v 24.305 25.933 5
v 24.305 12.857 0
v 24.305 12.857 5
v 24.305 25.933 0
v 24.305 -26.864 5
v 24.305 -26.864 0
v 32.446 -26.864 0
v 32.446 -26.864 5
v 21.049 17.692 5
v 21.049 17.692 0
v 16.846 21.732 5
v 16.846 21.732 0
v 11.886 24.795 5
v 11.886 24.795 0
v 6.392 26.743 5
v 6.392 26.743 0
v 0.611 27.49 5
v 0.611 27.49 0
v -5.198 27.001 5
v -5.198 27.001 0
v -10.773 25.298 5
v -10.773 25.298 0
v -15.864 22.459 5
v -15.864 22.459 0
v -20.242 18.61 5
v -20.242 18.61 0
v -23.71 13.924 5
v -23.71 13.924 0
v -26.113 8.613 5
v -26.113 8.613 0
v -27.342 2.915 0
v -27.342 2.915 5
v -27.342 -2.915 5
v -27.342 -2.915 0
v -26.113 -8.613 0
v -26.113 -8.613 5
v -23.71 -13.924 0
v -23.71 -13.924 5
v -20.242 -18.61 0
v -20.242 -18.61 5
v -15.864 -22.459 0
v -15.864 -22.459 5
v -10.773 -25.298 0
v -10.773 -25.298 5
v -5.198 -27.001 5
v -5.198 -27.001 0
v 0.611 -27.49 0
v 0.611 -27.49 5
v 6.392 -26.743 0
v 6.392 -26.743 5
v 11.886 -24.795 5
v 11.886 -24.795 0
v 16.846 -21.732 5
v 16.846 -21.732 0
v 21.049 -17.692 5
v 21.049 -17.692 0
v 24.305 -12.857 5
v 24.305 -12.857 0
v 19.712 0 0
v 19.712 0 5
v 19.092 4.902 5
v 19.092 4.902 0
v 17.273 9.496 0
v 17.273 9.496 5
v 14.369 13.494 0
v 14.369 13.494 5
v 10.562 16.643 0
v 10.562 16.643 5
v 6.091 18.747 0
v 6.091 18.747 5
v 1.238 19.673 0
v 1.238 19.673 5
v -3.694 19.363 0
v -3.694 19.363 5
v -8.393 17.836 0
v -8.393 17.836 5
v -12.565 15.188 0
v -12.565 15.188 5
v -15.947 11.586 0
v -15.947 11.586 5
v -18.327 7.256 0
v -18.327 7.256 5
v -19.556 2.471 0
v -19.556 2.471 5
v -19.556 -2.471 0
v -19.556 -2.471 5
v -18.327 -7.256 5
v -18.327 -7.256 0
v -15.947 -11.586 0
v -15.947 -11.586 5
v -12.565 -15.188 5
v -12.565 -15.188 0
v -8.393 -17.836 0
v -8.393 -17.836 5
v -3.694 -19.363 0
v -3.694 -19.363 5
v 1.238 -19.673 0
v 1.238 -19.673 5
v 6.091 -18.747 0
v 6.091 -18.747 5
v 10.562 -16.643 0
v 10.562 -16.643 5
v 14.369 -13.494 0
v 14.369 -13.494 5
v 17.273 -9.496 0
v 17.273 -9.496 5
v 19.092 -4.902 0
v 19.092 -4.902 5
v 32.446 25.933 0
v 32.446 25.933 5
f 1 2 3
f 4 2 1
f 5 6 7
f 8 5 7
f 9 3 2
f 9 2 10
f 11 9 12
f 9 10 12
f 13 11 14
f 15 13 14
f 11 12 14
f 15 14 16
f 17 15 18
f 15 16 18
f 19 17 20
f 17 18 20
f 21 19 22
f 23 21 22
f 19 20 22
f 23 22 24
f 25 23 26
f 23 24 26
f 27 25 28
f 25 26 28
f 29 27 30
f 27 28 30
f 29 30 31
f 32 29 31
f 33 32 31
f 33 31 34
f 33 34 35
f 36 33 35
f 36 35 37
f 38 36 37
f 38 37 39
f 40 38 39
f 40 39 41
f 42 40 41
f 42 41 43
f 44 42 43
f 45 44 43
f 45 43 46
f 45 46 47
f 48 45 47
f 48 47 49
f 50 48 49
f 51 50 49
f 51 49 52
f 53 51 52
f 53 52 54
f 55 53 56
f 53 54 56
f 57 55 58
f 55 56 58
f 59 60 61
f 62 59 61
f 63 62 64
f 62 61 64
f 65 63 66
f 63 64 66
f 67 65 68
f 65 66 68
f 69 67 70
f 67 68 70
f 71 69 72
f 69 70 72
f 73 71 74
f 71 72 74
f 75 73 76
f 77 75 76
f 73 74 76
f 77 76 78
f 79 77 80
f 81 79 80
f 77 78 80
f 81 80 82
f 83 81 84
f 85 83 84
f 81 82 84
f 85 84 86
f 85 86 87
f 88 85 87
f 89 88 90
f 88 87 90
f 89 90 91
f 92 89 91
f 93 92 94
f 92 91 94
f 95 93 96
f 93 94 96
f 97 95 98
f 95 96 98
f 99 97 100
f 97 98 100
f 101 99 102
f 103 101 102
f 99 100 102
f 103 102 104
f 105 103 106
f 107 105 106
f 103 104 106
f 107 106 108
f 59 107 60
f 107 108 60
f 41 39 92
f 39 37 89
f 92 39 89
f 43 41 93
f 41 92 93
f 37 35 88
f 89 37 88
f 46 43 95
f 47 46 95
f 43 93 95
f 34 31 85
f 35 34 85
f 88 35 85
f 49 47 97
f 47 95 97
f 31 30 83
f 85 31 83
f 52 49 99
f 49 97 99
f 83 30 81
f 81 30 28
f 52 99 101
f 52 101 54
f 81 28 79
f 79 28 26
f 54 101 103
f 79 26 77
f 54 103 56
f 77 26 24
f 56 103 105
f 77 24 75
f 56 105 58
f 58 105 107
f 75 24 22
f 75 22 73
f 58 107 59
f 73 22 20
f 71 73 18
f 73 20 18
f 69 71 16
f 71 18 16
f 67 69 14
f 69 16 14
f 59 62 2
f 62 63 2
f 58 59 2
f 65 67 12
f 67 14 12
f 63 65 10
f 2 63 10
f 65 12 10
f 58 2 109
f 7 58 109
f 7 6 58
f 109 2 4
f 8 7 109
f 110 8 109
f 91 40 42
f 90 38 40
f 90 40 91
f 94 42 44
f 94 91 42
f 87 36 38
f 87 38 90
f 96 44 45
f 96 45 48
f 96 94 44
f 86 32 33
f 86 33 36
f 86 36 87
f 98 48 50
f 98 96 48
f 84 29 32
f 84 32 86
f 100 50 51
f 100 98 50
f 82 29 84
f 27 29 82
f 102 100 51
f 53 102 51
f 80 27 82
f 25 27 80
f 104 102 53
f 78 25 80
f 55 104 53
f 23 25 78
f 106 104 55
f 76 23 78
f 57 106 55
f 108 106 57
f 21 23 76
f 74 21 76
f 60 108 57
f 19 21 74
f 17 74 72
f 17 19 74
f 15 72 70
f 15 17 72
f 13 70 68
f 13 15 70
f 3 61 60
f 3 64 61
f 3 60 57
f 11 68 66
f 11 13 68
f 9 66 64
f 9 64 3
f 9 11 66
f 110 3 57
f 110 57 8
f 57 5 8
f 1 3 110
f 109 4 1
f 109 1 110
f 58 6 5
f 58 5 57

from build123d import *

# Parameters (mm, degrees)
F0_R     = 27.496488
F1_DEPTH = 5
F2_R     = 19.711681
F3_DEPTH = 5
F4_W     = 8.140551
F4_H     = 52.797299
F5_DEPTH = 5


with BuildPart() as f1:
    # F0 (on Top) → F1 (new body)
    with BuildSketch(Plane.XY):
        Circle(F0_R)
    extrude(amount=F1_DEPTH)

    # F2 (on face) → F3 (cut)
    with BuildSketch(Plane.XY.offset(5)):
        Circle(F2_R)
    extrude(amount=-F3_DEPTH, mode=Mode.SUBTRACT)

    # F4 (on Top) → F5 (join)
    with BuildSketch(Plane.XY):
        with Locations((28.375639, -0.465175)):
            Rectangle(F4_W, F4_H)
    extrude(amount=F5_DEPTH)


solid = f1.part
